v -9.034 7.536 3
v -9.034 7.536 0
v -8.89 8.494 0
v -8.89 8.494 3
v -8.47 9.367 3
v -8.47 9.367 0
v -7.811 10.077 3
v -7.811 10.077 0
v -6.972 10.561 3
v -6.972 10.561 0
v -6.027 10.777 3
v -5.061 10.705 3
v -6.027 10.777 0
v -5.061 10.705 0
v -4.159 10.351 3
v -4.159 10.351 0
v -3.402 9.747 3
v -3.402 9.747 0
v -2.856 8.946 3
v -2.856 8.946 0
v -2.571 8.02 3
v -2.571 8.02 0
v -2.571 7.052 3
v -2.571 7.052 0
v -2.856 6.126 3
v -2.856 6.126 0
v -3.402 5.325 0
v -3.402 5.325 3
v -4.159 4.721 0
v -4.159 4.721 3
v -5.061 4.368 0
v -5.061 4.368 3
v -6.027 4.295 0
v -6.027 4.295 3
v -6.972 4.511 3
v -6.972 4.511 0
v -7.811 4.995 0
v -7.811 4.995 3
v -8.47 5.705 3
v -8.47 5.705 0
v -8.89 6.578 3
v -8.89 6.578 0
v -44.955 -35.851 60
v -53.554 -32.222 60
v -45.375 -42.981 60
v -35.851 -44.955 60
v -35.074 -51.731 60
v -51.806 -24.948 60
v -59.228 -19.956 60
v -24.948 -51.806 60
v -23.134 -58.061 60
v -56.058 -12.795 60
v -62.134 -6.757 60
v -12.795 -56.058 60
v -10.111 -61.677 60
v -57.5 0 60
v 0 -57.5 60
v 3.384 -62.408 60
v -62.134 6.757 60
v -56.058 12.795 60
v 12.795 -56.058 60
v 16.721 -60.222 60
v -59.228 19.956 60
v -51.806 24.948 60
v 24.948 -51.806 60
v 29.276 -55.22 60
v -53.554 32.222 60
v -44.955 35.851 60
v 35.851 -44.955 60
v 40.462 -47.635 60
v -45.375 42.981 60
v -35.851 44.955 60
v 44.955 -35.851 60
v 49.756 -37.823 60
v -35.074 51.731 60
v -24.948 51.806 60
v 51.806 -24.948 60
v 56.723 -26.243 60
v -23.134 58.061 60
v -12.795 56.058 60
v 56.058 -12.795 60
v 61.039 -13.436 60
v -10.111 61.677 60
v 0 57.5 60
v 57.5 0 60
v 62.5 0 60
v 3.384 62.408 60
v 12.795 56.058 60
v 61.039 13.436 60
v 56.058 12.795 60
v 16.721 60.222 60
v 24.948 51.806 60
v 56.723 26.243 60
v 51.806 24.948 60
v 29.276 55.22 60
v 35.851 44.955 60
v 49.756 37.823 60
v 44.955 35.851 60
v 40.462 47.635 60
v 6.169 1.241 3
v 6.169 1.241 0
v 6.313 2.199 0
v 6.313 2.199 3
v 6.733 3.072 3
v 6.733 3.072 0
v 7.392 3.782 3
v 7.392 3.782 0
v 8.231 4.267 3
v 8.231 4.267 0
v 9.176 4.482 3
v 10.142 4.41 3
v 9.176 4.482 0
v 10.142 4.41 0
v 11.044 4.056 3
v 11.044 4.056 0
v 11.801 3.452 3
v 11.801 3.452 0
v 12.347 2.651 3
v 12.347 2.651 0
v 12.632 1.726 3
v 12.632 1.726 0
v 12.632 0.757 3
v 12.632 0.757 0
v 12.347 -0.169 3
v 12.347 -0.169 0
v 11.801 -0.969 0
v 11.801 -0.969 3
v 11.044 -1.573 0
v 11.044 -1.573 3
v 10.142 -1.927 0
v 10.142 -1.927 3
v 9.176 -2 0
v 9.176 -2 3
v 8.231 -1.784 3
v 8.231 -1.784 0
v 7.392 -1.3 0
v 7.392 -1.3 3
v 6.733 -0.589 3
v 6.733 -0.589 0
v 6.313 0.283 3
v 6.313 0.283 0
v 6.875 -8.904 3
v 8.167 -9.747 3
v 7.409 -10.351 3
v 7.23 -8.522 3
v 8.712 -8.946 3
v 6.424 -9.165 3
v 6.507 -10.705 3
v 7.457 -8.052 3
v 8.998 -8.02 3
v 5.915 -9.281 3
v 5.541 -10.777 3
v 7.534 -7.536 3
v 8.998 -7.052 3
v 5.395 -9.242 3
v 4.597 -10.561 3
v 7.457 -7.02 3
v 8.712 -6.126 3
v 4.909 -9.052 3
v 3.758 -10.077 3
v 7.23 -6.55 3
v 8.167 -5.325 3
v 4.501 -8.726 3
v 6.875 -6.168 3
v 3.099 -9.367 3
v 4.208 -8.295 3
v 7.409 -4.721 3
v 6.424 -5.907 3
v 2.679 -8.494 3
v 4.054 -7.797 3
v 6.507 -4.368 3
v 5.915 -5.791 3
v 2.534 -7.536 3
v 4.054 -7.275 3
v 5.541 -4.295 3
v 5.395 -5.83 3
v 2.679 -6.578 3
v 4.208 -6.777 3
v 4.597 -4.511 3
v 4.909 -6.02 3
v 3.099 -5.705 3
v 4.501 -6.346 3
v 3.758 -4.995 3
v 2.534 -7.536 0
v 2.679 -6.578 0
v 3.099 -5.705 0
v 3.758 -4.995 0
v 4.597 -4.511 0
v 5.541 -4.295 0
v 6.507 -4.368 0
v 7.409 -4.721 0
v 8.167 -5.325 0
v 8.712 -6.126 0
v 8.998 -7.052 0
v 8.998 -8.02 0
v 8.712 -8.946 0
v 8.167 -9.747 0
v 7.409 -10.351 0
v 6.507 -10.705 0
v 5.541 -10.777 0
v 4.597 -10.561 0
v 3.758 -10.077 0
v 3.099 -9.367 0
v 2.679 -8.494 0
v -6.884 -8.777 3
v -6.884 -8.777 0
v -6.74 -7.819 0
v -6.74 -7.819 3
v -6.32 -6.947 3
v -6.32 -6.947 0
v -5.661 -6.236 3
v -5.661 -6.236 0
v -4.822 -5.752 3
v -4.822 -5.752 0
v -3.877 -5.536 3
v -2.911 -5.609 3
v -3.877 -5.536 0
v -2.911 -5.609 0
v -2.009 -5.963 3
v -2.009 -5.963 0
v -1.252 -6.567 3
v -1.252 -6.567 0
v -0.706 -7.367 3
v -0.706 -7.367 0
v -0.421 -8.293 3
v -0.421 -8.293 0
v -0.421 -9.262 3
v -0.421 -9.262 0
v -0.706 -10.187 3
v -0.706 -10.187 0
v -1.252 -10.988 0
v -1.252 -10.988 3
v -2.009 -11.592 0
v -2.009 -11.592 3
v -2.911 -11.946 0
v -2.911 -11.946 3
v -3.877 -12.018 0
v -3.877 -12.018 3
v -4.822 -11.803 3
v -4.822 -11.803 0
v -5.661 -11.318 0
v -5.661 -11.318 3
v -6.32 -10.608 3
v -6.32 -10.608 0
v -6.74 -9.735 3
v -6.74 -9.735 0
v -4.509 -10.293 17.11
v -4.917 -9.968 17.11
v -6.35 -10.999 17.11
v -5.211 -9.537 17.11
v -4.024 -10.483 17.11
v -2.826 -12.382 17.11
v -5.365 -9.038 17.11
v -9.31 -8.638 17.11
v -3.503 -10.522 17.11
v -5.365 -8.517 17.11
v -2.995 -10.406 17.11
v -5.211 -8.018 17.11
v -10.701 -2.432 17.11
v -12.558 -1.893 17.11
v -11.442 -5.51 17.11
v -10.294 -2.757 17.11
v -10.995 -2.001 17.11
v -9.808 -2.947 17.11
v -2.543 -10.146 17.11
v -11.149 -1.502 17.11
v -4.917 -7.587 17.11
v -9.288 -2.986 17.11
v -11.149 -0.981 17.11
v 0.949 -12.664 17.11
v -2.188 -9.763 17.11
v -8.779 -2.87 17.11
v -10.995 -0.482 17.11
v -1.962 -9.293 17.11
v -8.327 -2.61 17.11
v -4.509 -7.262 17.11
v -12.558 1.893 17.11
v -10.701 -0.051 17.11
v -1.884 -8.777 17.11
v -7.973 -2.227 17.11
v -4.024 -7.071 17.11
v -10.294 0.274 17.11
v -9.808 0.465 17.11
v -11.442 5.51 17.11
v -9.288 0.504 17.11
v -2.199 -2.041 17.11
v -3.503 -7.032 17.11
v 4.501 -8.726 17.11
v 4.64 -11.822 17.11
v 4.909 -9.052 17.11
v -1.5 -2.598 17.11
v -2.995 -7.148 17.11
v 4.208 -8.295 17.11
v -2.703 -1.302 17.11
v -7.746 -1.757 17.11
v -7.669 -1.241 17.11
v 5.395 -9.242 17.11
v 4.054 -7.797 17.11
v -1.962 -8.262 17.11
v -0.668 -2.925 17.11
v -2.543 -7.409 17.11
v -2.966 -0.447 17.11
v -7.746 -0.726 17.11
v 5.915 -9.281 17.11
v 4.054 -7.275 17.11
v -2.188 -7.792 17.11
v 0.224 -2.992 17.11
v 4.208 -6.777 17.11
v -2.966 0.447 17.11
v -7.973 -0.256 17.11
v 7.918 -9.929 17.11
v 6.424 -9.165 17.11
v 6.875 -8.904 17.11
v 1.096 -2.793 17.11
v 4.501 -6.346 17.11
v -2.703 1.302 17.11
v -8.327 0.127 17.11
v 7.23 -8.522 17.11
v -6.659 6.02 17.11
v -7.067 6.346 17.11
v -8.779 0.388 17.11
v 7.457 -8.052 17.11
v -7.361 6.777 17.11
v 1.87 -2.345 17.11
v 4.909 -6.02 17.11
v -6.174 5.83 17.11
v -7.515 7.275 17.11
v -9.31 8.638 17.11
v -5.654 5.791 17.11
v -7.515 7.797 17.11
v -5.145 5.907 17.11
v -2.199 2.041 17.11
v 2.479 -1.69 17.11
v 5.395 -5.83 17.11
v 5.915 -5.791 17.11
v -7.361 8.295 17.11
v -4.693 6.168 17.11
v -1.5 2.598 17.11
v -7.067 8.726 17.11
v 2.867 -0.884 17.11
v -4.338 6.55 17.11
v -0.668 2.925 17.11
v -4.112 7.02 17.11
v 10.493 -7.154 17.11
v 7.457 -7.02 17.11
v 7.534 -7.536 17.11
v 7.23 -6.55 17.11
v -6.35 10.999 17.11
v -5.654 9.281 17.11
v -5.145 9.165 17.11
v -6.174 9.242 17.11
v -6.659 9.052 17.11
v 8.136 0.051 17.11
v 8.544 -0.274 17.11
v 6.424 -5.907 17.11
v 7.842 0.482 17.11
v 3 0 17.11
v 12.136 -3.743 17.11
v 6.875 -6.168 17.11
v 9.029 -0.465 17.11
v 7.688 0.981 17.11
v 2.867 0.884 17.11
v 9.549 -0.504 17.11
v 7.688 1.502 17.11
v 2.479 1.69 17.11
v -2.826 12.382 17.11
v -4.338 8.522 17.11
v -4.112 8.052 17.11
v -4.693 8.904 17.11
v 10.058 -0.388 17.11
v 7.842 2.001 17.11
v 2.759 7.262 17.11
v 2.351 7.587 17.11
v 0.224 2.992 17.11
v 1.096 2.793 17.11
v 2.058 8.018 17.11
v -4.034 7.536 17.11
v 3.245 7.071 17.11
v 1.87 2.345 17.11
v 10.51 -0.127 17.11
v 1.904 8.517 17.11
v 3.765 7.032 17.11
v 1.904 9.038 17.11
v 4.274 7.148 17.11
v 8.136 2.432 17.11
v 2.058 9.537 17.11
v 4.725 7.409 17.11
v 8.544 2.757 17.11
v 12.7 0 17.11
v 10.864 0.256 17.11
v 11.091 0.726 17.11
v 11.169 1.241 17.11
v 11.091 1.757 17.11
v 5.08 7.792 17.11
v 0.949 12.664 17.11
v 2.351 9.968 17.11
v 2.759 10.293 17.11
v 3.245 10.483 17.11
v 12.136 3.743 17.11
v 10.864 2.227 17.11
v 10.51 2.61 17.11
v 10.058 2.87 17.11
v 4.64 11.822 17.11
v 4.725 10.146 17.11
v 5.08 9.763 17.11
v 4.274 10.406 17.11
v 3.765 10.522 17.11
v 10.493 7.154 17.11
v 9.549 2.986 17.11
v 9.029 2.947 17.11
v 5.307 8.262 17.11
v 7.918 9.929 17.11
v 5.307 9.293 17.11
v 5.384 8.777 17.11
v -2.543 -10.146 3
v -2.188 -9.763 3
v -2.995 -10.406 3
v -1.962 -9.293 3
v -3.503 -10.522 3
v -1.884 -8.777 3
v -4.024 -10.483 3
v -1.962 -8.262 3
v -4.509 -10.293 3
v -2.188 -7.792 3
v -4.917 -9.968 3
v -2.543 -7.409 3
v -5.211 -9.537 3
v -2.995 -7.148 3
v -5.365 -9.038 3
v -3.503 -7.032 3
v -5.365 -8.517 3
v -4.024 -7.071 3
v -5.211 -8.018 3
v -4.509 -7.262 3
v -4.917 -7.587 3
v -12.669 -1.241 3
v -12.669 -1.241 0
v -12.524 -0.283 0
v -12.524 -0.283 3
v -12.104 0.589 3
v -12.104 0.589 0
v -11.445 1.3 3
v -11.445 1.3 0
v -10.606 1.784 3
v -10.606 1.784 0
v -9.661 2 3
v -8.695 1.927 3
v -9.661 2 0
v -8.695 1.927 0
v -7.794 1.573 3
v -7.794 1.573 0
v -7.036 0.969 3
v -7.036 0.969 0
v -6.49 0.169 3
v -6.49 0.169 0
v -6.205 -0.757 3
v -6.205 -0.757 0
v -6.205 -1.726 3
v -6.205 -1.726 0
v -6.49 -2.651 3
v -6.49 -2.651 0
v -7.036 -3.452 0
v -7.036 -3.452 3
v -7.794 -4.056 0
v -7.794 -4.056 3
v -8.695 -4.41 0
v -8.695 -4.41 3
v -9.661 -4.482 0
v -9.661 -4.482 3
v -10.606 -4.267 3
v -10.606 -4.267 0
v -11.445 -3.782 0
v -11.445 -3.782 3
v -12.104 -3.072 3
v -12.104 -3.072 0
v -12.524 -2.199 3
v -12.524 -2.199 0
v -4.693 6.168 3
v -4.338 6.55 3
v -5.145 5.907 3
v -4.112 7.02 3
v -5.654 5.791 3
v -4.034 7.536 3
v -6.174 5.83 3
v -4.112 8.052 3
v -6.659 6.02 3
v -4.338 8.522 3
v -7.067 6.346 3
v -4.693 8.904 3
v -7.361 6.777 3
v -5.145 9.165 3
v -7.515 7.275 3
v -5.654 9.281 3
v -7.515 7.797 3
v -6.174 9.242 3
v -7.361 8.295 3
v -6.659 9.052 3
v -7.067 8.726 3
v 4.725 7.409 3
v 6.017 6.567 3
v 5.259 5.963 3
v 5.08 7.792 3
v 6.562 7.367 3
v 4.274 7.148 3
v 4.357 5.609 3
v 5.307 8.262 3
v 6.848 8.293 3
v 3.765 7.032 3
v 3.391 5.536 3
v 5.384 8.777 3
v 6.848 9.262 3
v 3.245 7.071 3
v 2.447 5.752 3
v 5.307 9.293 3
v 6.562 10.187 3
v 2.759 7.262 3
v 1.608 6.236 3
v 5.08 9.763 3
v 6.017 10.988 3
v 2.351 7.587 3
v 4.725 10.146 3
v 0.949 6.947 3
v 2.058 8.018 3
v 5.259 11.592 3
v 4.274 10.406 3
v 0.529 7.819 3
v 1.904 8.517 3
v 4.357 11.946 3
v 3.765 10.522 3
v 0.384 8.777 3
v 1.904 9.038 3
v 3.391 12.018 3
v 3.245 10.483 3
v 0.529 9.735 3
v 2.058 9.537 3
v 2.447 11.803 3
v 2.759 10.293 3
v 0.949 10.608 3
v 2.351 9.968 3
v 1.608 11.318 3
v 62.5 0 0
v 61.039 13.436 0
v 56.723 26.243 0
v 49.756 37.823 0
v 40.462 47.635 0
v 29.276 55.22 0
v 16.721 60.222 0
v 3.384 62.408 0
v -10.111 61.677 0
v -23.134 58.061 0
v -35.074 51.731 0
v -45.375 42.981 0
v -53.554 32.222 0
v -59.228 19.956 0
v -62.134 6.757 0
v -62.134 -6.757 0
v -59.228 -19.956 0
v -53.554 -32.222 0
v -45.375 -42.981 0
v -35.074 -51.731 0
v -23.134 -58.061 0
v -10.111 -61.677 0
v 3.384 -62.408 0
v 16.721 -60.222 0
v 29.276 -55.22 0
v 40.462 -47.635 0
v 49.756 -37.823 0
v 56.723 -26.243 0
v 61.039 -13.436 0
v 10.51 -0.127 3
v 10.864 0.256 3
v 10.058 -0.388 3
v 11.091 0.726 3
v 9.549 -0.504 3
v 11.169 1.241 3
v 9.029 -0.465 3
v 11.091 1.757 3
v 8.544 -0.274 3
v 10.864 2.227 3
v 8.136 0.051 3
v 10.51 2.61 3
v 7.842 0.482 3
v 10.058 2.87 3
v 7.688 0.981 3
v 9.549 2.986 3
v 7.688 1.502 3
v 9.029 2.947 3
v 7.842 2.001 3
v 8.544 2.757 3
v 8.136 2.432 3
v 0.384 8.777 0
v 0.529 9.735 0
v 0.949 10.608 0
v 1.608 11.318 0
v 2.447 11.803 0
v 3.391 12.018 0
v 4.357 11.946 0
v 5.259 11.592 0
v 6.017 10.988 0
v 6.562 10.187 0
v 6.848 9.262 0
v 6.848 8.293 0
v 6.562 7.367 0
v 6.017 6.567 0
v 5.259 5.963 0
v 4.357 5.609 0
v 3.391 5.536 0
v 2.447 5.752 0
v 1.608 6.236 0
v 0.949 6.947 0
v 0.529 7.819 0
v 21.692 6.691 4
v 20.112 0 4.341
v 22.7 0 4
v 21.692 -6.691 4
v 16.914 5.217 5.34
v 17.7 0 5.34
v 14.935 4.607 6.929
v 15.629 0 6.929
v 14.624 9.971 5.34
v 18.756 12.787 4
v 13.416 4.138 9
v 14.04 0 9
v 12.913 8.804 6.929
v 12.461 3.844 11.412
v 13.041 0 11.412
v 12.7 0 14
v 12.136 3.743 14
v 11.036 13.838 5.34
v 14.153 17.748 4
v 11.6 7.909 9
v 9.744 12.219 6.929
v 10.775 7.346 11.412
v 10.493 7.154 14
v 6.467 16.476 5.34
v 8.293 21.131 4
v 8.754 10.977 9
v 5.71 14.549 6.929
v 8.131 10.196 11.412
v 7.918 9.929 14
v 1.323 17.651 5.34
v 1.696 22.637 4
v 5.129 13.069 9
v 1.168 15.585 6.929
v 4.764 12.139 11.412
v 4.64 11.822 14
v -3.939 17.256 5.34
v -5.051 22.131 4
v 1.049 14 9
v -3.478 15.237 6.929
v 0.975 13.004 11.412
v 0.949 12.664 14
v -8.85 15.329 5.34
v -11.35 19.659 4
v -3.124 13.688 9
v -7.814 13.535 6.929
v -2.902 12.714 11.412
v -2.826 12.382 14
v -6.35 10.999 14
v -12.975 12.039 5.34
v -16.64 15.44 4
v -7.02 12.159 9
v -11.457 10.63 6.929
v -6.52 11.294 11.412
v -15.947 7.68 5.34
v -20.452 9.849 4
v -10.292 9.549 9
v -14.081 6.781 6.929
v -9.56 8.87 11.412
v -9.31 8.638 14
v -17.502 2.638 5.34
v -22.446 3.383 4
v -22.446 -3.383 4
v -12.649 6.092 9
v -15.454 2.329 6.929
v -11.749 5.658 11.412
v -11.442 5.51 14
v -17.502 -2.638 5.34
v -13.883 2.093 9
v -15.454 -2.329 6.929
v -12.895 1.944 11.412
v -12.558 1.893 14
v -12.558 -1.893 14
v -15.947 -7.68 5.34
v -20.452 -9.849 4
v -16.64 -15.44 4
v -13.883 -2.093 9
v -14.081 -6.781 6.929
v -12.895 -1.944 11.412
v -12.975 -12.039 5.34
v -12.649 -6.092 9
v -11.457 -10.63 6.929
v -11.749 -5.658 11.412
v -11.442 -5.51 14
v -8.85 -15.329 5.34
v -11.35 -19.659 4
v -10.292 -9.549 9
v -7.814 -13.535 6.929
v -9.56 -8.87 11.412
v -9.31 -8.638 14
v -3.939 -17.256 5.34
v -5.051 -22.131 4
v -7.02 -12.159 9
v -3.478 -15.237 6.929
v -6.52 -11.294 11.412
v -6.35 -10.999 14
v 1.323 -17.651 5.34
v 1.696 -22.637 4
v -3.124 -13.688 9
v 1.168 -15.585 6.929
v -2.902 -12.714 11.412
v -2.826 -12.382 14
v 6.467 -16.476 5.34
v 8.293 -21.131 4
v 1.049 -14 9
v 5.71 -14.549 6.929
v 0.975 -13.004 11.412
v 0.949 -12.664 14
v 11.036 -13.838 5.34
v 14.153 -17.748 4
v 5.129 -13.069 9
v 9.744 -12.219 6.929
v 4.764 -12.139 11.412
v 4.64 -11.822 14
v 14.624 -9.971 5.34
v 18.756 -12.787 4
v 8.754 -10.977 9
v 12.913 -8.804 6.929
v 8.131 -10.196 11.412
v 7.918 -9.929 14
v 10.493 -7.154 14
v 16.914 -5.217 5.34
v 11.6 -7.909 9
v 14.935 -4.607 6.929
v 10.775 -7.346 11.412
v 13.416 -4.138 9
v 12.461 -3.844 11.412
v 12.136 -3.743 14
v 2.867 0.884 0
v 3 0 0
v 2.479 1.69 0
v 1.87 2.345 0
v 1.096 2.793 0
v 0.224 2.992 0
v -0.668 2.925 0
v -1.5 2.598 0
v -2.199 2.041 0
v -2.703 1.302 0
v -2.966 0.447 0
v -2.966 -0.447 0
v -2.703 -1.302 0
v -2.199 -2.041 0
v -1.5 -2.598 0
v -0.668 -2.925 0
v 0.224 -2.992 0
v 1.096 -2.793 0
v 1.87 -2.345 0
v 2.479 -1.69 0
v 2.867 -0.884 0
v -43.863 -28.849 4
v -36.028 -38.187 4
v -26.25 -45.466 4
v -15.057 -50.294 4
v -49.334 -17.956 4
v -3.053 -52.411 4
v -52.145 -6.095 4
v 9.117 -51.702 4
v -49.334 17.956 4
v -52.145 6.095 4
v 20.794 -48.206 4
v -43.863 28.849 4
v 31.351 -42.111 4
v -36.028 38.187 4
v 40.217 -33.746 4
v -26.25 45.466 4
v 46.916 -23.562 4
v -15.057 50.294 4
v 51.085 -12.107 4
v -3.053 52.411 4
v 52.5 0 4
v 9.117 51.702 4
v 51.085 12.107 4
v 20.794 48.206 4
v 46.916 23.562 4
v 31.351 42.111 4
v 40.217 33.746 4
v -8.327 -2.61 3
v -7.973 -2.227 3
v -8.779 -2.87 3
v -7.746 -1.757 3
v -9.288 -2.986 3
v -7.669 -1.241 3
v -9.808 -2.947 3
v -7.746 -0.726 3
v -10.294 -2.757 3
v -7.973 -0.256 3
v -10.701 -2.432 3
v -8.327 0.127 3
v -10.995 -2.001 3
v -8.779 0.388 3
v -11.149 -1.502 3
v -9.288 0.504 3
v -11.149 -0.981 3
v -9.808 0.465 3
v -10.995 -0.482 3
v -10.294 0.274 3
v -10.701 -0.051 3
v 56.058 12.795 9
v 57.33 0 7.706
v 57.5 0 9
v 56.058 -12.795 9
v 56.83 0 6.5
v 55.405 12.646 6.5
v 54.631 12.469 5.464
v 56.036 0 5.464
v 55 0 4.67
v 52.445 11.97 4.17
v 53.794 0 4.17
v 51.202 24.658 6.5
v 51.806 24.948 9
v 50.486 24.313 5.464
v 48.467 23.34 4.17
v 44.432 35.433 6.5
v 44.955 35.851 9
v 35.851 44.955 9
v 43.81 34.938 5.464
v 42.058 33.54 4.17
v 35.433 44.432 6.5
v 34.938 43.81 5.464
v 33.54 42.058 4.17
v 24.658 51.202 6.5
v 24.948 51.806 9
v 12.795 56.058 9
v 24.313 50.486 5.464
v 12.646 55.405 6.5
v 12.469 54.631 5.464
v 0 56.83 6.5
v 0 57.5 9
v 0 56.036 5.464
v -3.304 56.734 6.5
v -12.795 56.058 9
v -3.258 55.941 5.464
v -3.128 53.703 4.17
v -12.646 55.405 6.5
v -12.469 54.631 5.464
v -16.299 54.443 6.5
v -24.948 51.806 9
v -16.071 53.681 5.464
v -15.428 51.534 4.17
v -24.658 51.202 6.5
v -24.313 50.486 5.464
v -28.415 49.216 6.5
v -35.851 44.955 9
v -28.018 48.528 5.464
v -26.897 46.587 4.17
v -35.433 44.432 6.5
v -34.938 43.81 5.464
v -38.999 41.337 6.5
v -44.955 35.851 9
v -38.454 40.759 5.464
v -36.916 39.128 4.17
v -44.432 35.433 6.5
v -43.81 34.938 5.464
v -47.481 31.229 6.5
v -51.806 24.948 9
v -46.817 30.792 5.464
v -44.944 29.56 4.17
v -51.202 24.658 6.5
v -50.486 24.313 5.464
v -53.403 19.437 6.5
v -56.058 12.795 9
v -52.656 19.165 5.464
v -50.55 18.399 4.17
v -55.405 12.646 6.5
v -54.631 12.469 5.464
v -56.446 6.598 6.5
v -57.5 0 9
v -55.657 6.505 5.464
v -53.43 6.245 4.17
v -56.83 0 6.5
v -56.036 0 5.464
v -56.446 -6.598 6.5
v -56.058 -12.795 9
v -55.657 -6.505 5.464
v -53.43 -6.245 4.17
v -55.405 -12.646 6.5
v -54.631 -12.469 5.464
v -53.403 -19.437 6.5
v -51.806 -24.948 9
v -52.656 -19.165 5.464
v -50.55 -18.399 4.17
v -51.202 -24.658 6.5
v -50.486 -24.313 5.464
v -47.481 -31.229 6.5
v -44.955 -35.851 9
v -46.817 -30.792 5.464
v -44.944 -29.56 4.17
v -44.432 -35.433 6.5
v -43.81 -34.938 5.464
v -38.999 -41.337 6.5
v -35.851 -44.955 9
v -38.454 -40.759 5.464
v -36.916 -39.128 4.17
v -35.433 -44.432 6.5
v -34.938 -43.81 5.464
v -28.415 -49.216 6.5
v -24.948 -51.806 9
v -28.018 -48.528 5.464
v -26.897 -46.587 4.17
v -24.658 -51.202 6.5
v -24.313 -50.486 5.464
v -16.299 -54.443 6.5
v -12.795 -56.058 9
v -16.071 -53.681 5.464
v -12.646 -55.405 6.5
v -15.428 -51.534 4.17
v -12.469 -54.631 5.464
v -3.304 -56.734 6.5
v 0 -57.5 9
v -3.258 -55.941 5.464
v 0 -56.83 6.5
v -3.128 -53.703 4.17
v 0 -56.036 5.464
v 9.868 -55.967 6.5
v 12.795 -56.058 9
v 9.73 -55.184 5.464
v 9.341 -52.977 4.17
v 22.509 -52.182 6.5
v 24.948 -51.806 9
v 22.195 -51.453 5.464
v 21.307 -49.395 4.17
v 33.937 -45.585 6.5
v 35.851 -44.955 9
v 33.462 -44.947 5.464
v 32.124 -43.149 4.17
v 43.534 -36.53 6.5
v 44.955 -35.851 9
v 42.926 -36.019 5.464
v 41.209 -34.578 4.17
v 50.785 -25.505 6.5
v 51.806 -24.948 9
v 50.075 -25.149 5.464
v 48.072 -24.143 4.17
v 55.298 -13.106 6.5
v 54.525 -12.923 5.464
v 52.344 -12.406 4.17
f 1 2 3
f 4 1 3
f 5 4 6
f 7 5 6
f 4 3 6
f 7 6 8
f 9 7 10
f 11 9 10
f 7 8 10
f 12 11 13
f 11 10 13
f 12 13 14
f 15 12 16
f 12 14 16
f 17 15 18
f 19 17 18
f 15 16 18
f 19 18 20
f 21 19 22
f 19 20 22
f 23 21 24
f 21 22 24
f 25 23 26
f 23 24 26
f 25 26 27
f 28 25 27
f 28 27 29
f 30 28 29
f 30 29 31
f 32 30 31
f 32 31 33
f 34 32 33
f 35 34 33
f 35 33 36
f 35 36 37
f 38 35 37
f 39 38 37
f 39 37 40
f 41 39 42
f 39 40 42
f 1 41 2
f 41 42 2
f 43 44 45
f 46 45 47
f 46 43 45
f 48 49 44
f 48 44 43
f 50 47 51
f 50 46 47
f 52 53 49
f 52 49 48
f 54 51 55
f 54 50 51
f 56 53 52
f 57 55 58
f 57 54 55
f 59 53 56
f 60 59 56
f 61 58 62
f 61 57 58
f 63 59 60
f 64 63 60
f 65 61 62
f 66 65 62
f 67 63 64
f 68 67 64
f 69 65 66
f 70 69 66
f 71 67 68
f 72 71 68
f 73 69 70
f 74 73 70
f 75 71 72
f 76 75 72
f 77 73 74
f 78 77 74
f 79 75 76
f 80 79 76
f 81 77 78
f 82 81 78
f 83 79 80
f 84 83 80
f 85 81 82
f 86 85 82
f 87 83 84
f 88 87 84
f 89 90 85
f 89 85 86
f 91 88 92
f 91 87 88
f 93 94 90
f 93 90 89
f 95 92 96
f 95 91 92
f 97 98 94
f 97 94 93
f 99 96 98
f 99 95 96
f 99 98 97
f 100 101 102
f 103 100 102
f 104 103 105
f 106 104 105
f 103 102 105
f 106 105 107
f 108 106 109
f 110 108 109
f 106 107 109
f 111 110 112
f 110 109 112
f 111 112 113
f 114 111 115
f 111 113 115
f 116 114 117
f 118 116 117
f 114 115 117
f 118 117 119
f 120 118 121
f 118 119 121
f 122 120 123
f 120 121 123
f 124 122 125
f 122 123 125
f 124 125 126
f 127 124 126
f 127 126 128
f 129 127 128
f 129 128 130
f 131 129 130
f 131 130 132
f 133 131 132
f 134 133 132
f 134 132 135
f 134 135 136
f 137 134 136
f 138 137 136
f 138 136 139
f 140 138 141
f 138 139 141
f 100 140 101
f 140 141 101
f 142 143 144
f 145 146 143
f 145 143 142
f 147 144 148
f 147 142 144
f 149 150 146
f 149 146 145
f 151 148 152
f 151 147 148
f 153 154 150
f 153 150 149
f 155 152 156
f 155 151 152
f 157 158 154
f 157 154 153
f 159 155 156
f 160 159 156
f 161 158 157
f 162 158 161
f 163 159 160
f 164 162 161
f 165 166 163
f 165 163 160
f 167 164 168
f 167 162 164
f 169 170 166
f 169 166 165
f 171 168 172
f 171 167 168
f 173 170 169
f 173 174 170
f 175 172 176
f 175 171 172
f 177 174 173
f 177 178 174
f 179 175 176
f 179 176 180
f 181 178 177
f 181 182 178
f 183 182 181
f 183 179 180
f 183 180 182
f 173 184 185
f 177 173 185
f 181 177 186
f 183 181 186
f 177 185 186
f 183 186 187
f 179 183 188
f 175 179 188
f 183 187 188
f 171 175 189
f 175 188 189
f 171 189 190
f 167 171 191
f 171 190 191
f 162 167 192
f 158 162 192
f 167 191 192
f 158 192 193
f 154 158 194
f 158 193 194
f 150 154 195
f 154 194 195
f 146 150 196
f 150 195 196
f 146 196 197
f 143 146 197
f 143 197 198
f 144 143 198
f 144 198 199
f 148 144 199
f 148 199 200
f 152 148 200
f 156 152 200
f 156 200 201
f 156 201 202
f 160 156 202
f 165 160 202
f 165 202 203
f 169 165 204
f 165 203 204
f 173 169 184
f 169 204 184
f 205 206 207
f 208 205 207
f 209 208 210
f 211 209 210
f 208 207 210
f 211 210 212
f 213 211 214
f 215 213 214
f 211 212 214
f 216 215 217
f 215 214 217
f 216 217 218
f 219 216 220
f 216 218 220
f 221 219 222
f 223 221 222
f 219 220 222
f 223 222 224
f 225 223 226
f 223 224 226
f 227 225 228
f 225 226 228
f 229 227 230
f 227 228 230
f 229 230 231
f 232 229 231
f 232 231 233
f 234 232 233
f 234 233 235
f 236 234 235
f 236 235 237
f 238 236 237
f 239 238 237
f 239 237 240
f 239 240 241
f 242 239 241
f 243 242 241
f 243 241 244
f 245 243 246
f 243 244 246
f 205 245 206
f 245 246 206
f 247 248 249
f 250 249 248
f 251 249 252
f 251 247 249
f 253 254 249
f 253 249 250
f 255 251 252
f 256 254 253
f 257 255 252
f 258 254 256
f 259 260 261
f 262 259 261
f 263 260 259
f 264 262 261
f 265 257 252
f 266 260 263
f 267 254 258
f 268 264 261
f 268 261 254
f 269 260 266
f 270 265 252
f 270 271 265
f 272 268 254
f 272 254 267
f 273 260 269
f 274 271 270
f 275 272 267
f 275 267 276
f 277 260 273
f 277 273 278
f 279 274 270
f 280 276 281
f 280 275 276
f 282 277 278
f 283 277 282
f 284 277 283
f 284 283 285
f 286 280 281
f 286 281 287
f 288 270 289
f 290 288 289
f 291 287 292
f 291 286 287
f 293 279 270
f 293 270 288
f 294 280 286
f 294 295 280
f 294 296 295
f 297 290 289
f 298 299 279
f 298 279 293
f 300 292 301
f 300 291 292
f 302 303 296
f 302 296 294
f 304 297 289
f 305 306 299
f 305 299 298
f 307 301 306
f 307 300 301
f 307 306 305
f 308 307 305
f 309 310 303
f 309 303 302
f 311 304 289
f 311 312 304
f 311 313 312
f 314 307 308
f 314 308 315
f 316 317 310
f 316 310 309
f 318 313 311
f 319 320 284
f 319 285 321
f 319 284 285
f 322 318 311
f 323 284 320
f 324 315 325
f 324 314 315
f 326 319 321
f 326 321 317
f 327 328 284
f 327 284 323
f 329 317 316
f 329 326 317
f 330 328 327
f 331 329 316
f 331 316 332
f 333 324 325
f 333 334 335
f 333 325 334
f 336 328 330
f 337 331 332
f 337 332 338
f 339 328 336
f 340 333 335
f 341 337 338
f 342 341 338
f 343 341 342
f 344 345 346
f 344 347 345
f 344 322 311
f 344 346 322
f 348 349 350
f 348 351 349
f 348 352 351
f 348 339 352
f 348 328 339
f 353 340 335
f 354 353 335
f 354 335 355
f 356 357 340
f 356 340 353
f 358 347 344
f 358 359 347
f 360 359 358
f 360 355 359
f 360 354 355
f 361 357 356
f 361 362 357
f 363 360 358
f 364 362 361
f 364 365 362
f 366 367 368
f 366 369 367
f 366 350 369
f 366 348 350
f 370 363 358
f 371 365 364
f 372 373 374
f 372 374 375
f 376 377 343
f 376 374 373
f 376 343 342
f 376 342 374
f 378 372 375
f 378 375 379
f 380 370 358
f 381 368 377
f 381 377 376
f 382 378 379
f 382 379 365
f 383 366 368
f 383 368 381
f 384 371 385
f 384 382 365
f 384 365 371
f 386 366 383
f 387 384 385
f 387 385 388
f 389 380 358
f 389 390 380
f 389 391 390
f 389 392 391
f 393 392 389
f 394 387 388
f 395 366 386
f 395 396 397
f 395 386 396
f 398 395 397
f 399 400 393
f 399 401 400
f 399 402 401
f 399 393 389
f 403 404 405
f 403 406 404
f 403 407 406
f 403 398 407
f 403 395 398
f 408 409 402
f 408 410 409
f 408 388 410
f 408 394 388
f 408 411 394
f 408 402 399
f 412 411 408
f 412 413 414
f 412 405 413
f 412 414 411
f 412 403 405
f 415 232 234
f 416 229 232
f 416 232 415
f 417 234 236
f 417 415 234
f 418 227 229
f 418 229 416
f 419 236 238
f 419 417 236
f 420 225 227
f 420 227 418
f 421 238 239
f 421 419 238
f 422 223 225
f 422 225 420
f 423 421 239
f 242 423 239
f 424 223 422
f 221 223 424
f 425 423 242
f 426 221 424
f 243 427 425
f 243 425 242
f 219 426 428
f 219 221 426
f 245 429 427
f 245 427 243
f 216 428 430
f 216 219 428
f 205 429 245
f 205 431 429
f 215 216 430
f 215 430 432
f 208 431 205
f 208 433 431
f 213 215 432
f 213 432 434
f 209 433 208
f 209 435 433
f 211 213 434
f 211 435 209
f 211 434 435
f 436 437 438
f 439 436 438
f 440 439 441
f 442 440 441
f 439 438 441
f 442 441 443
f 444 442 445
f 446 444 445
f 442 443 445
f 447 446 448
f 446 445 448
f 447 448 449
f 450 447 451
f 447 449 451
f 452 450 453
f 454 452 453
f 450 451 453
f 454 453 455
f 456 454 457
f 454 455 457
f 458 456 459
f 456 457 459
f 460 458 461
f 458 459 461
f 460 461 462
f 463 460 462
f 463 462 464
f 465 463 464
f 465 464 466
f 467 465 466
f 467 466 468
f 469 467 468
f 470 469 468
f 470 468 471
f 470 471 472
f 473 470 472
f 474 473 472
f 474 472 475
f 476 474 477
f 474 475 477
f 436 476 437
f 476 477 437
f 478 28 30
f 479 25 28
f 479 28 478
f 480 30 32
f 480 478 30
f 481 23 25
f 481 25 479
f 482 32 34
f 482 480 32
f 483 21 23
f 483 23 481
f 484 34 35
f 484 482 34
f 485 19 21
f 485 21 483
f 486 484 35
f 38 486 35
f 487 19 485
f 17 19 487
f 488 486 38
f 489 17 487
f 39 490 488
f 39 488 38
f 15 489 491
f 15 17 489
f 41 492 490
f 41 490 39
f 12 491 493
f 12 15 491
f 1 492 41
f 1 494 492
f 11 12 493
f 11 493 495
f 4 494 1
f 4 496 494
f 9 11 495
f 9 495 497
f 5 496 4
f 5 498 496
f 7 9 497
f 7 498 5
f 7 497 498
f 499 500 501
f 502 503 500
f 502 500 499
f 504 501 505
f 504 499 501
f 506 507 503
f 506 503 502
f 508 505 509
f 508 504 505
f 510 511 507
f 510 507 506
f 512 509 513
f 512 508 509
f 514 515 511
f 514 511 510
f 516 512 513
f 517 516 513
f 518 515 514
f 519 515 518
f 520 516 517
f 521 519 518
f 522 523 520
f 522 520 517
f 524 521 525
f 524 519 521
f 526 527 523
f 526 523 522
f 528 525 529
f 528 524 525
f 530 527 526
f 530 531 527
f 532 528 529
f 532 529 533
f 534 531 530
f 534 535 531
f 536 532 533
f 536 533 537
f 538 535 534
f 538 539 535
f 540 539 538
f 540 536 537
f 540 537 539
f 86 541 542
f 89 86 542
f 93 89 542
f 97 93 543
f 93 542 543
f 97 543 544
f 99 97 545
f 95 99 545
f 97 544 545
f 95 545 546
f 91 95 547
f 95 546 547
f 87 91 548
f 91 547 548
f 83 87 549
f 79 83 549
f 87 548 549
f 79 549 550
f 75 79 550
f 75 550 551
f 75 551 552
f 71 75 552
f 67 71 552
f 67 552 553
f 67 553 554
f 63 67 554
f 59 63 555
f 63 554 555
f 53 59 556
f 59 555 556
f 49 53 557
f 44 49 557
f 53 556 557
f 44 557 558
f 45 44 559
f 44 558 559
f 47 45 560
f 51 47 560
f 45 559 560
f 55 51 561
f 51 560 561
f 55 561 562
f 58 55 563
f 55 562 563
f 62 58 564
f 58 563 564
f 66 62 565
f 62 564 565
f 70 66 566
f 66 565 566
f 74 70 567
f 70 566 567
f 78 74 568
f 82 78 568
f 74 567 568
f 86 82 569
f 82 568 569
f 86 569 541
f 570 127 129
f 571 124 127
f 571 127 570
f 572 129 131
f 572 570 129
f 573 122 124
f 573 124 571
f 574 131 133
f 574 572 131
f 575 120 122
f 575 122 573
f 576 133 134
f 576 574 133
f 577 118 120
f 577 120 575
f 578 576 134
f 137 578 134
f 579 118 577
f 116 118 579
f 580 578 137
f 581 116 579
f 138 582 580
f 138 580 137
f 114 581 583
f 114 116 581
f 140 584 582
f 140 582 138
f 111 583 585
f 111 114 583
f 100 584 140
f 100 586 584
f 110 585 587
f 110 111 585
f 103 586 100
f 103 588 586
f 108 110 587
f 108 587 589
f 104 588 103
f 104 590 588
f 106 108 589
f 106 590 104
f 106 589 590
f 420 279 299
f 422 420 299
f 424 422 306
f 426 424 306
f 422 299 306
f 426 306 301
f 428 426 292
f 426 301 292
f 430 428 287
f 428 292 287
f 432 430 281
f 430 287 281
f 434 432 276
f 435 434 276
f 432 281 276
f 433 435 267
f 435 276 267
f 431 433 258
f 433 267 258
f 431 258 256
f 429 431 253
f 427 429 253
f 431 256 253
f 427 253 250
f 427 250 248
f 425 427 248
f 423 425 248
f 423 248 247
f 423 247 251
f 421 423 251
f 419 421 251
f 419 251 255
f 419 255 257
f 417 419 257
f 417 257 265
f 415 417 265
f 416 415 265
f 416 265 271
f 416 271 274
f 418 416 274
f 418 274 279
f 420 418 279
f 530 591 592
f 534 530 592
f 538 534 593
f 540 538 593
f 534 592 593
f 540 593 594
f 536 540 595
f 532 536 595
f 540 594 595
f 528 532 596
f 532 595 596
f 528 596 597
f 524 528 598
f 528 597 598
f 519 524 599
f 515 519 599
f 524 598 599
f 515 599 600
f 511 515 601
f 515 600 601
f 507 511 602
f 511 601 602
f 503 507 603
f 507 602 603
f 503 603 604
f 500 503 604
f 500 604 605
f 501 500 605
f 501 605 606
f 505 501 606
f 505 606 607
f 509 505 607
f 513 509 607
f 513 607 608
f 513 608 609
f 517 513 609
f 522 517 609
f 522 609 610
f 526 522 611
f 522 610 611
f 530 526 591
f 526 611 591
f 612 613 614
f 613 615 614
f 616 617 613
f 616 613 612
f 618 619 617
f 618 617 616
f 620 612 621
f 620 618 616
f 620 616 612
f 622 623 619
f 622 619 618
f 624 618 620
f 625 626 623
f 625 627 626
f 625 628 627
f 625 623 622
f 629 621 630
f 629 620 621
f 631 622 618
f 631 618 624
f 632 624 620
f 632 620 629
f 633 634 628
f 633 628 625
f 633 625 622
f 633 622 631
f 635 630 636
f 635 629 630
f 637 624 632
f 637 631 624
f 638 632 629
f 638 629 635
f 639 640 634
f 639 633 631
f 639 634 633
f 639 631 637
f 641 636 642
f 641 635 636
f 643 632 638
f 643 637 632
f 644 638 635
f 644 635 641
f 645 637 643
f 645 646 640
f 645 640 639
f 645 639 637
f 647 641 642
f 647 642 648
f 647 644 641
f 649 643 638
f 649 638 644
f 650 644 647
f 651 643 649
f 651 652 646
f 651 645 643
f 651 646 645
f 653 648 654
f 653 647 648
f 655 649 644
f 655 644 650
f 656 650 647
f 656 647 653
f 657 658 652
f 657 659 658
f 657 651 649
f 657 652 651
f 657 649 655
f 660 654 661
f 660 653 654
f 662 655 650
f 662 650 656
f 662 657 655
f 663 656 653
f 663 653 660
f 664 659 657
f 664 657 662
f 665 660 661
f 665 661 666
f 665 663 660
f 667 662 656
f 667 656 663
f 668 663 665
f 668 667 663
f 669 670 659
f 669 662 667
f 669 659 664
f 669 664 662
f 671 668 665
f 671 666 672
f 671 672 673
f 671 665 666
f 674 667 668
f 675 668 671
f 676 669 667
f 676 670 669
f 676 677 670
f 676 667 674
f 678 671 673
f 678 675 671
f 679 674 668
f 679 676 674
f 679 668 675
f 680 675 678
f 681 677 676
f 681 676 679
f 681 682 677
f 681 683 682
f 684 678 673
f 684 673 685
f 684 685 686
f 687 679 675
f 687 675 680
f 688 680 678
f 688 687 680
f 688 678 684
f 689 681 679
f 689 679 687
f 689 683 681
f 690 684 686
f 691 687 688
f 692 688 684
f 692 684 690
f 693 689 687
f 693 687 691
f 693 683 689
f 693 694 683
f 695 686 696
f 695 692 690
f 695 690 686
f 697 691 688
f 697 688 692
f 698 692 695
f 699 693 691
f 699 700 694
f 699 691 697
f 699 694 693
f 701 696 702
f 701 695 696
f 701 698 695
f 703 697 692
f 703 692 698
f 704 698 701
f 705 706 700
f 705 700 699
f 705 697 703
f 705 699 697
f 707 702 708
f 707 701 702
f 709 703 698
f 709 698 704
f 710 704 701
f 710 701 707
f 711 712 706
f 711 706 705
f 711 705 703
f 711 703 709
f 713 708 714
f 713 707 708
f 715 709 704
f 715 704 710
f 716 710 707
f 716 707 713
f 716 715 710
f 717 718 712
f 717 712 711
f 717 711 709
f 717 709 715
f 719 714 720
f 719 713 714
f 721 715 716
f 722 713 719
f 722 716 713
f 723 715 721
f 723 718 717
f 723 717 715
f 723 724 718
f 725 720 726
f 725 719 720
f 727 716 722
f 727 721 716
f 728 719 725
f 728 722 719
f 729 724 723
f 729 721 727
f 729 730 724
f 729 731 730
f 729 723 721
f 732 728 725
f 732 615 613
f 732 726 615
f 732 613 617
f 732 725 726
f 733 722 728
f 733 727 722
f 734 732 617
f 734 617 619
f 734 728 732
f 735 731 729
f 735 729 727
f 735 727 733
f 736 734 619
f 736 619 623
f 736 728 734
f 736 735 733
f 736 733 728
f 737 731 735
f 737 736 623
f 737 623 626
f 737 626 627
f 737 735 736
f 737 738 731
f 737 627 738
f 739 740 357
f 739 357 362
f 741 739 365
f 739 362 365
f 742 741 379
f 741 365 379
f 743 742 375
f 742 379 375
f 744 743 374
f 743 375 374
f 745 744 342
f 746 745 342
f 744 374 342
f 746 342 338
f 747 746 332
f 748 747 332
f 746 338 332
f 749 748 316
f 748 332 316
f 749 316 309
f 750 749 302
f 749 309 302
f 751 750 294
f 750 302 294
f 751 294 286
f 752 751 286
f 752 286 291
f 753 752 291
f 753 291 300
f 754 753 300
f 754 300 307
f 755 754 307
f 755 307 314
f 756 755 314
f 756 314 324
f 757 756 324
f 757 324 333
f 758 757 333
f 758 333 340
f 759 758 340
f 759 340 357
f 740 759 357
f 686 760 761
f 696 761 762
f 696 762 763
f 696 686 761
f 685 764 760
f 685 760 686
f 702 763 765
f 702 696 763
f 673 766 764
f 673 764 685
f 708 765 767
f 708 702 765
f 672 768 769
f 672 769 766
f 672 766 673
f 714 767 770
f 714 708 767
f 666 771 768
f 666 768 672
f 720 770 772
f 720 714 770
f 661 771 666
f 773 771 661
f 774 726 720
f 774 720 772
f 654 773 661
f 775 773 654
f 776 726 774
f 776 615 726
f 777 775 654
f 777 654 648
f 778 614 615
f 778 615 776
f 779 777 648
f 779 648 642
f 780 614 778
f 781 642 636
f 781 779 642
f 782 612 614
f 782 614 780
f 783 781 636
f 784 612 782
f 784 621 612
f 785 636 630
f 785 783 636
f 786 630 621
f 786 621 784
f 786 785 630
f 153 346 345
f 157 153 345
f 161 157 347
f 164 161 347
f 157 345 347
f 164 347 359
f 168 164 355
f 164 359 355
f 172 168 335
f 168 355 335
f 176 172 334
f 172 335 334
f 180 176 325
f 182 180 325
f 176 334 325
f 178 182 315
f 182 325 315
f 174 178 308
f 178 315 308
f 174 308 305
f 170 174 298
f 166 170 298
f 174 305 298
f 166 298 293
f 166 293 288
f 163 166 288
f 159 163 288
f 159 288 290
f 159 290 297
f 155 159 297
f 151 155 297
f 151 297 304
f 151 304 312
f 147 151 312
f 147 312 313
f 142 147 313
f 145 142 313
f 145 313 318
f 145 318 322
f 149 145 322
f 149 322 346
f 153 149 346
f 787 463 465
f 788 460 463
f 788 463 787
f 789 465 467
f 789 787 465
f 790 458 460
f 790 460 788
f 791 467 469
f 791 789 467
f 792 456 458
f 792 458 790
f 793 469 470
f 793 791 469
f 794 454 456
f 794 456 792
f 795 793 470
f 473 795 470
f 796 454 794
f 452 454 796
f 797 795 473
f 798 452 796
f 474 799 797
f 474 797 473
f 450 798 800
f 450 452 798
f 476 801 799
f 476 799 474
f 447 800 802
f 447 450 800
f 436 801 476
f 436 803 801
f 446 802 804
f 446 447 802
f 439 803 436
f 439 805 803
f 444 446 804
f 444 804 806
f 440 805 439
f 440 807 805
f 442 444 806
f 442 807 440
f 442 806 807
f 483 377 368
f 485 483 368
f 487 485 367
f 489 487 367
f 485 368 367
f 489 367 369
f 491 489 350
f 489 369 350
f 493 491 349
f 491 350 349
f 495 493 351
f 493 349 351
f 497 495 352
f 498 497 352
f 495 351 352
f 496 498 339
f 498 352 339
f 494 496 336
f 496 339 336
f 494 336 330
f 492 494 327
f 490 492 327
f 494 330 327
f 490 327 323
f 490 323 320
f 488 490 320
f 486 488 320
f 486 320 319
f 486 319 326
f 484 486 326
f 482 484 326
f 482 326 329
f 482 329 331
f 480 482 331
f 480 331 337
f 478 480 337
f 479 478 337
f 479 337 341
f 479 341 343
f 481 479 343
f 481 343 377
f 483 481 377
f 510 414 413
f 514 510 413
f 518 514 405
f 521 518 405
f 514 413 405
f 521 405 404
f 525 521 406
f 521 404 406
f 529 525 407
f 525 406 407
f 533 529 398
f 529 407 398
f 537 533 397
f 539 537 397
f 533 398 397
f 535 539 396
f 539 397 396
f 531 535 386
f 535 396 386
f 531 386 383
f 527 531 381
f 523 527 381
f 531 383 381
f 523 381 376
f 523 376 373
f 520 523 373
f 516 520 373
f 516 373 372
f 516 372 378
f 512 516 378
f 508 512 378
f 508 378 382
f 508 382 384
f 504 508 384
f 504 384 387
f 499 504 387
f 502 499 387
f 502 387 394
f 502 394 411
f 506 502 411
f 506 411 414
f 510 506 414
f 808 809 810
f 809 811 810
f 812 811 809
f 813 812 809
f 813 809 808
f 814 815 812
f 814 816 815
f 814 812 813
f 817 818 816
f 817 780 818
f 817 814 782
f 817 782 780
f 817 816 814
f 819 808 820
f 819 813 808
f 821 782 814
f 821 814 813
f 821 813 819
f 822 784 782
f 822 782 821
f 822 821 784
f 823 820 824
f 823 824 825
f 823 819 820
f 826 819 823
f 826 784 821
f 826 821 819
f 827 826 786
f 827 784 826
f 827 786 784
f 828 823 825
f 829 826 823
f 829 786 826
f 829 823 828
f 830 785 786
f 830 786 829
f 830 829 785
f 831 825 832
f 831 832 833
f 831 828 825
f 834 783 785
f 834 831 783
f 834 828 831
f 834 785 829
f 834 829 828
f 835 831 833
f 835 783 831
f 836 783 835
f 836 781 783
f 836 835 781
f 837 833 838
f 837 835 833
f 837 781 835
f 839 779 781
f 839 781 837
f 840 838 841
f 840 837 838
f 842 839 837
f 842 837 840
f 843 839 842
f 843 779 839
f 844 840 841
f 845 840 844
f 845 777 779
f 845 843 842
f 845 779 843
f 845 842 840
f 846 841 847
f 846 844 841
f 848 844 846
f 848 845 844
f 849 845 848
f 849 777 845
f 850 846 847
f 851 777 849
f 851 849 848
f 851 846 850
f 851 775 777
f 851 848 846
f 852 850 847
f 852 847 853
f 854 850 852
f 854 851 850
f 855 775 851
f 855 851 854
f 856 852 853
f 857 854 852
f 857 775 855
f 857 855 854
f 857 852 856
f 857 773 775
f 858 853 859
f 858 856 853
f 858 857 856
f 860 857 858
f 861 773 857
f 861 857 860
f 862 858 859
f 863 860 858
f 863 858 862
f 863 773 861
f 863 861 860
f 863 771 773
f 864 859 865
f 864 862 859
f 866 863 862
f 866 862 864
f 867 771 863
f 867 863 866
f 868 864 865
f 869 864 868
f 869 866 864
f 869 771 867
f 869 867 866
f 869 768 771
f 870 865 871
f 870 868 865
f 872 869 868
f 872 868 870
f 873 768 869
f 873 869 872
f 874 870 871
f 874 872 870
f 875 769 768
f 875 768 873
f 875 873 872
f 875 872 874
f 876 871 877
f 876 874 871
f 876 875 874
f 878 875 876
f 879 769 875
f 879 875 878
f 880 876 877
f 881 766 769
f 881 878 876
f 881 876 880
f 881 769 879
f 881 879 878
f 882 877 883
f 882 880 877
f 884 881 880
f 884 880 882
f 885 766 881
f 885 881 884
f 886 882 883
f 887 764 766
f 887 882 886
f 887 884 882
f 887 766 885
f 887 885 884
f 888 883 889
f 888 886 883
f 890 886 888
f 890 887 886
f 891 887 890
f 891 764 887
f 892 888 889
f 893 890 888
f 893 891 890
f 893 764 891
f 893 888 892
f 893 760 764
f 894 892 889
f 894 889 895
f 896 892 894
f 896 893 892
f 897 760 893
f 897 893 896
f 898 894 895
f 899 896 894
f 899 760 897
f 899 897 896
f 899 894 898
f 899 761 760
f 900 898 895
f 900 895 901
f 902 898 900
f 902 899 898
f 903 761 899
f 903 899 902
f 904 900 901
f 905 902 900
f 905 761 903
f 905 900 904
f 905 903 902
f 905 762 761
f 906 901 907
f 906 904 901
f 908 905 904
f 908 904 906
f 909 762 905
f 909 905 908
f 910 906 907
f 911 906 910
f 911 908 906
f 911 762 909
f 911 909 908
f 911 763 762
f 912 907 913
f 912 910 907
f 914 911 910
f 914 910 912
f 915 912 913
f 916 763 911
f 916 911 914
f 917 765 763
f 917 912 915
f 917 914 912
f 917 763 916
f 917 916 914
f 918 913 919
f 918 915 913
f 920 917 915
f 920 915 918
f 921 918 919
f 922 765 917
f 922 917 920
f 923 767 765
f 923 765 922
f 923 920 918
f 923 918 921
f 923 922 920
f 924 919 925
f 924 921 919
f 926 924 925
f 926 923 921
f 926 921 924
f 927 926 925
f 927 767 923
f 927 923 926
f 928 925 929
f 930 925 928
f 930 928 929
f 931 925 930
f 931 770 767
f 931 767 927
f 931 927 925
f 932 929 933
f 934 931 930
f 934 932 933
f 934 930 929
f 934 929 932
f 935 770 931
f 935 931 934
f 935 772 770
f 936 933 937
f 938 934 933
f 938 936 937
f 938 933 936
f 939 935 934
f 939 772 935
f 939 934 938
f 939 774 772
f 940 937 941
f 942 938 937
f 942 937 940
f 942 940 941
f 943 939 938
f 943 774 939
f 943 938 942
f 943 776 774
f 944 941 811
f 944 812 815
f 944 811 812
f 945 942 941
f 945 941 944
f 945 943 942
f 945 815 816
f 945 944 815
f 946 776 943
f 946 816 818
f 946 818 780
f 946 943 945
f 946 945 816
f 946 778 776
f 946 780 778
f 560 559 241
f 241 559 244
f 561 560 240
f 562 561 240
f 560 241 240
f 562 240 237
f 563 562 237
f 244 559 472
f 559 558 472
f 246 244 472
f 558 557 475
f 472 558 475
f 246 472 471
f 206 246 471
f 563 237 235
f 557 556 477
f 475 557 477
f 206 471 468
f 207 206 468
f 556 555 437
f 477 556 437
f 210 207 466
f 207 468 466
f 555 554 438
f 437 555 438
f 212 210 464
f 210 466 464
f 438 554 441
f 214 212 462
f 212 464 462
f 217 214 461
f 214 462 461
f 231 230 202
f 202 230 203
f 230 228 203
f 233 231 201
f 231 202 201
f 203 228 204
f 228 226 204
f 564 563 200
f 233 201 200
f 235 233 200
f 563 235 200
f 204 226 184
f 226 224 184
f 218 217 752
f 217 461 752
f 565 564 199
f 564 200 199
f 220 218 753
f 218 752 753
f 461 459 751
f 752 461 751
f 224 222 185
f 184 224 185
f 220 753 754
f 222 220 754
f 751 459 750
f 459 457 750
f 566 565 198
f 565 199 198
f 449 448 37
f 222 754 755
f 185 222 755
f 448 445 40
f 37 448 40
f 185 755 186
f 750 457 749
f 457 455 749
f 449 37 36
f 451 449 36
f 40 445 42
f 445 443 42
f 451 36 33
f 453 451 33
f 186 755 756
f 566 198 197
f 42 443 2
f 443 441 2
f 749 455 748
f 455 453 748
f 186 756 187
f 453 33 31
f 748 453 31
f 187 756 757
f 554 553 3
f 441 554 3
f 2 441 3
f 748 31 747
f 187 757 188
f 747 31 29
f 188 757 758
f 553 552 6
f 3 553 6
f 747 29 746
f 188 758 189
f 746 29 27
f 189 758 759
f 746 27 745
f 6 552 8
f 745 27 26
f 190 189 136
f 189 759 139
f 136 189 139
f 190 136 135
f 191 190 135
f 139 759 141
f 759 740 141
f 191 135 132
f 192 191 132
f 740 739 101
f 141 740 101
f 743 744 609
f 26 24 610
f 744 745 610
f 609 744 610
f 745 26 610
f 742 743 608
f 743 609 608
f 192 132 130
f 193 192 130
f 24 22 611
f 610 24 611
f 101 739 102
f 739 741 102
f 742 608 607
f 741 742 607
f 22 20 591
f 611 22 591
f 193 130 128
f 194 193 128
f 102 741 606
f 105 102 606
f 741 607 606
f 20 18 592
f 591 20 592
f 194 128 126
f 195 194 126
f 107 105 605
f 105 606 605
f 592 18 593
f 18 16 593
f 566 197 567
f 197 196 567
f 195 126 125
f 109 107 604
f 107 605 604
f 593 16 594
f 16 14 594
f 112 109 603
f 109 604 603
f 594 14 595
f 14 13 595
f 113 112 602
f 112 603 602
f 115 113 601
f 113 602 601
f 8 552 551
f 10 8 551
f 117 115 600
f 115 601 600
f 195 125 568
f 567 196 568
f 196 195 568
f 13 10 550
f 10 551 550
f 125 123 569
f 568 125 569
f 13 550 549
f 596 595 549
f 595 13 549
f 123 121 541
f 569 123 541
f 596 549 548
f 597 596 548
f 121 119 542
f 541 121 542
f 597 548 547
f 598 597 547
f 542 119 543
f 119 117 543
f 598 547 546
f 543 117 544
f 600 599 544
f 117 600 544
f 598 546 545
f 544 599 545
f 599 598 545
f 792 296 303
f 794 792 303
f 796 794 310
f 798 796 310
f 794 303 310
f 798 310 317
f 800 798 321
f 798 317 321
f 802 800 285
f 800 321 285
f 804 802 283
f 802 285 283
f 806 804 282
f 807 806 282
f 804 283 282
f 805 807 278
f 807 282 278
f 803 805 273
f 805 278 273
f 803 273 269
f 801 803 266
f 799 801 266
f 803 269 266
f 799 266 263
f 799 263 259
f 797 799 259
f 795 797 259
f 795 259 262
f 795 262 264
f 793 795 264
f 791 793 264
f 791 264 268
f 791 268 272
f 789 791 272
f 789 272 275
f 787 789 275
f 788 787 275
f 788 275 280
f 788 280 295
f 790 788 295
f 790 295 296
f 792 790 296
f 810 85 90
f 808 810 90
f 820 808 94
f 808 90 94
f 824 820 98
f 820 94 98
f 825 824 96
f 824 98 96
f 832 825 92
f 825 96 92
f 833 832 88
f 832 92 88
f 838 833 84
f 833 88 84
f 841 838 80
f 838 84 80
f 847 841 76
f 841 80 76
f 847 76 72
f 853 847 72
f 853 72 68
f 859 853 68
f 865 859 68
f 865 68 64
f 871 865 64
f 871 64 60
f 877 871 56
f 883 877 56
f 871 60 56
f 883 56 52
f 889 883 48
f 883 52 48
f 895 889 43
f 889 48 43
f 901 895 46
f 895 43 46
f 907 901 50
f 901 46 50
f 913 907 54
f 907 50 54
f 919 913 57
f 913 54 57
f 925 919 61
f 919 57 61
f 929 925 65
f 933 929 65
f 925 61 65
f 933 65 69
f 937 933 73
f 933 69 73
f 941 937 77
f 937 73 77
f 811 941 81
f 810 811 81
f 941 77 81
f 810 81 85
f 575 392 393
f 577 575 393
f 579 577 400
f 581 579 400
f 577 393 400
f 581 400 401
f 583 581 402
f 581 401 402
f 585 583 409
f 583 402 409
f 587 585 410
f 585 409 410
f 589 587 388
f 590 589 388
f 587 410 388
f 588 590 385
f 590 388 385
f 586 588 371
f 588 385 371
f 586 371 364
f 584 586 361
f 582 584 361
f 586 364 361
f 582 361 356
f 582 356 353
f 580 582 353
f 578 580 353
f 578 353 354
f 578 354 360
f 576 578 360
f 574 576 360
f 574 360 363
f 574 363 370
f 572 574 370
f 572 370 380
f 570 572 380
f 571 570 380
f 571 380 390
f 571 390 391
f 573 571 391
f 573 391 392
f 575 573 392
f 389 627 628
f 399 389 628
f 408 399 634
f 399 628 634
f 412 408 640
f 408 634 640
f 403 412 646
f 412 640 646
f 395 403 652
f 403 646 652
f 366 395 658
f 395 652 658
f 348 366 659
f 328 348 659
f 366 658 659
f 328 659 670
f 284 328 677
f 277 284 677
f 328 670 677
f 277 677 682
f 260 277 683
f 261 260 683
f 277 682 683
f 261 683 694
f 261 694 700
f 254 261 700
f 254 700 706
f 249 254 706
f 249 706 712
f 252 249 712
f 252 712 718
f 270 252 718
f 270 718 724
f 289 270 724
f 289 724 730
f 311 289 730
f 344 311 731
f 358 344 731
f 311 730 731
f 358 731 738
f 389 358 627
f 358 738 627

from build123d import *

# Parameters (mm, degrees)
SKETCH1_R           = 62.5
BOSS_EXTRUDE1_DEPTH = 60
SKETCH2_R           = 57.5
CUT_EXTRUDE1_DEPTH  = 56
SKETCH3_R           = 12.7
BOSS_EXTRUDE2_DEPTH = 13.11
SKETCH4_R           = 1.75
SKETCH4_R_2         = 3
CUT_EXTRUDE2_DEPTH  = 99.244857881
SKETCH5_R           = 3.25
CUT_EXTRUDE3_DEPTH  = 3
FILLET1_R           = 5
FILLET2_R           = 10


with BuildPart() as part:
    # Sketch1 → Boss-Extrude1 (new body)
    with BuildSketch(Plane.XY):
        Circle(SKETCH1_R)
    extrude(amount=BOSS_EXTRUDE1_DEPTH)

    # Sketch2 → Cut-Extrude1 (cut)
    with BuildSketch(Plane.XY.offset(60)):
        Circle(SKETCH2_R)
    extrude(amount=-CUT_EXTRUDE1_DEPTH, mode=Mode.SUBTRACT)

    # Sketch3 → Boss-Extrude2 (add)
    with BuildSketch(Plane.XY.offset(4)):
        Circle(SKETCH3_R)
    extrude(amount=BOSS_EXTRUDE2_DEPTH)

    # Sketch4 → Cut-Extrude2 (cut, through all)
    with BuildSketch(Plane.XY.offset(17.11)):
        with Locations((-5.784301124, 7.536037454)):
            Circle(SKETCH4_R)
        with Locations((-9.418550441, -1.24133299)):
            Circle(SKETCH4_R)
        with Locations((-3.634249317, -8.777370444)):
            Circle(SKETCH4_R)
        with Locations((5.784301124, -7.536037454)):
            Circle(SKETCH4_R)
        with Locations((9.418550441, 1.24133299)):
            Circle(SKETCH4_R)
        with Locations((3.634249317, 8.777370444)):
            Circle(SKETCH4_R)
        Circle(SKETCH4_R_2)
    extrude(amount=-CUT_EXTRUDE2_DEPTH, mode=Mode.SUBTRACT)

    # Sketch5 → Cut-Extrude3 (cut)
    with BuildSketch(Plane(origin=(0, 0, 0), x_dir=(-1, 0, 0), z_dir=(0, 0, -1))):
        with Locations((-9.418550441, 1.24133299)):
            Circle(SKETCH5_R)
        with Locations((-3.634249317, 8.777370444)):
            Circle(SKETCH5_R)
        with Locations((5.784301124, 7.536037454)):
            Circle(SKETCH5_R)
        with Locations((9.418550441, -1.24133299)):
            Circle(SKETCH5_R)
        with Locations((3.634249317, -8.777370444)):
            Circle(SKETCH5_R)
        with Locations((-5.784301124, -7.536037454)):
            Circle(SKETCH5_R)
    extrude(amount=-CUT_EXTRUDE3_DEPTH, mode=Mode.SUBTRACT)

    # Fillet1
    fillet1_edges = [part.edges().sort_by_distance(p)[0] for p in [
        (-57.5, 0, 4),
    ]]
    fillet(fillet1_edges, radius=FILLET1_R)

    # Fillet2
    fillet2_edges = [part.edges().sort_by_distance(p)[0] for p in [
        (-12.7, 0, 4),
    ]]
    fillet(fillet2_edges, radius=FILLET2_R)


solid = part.part
